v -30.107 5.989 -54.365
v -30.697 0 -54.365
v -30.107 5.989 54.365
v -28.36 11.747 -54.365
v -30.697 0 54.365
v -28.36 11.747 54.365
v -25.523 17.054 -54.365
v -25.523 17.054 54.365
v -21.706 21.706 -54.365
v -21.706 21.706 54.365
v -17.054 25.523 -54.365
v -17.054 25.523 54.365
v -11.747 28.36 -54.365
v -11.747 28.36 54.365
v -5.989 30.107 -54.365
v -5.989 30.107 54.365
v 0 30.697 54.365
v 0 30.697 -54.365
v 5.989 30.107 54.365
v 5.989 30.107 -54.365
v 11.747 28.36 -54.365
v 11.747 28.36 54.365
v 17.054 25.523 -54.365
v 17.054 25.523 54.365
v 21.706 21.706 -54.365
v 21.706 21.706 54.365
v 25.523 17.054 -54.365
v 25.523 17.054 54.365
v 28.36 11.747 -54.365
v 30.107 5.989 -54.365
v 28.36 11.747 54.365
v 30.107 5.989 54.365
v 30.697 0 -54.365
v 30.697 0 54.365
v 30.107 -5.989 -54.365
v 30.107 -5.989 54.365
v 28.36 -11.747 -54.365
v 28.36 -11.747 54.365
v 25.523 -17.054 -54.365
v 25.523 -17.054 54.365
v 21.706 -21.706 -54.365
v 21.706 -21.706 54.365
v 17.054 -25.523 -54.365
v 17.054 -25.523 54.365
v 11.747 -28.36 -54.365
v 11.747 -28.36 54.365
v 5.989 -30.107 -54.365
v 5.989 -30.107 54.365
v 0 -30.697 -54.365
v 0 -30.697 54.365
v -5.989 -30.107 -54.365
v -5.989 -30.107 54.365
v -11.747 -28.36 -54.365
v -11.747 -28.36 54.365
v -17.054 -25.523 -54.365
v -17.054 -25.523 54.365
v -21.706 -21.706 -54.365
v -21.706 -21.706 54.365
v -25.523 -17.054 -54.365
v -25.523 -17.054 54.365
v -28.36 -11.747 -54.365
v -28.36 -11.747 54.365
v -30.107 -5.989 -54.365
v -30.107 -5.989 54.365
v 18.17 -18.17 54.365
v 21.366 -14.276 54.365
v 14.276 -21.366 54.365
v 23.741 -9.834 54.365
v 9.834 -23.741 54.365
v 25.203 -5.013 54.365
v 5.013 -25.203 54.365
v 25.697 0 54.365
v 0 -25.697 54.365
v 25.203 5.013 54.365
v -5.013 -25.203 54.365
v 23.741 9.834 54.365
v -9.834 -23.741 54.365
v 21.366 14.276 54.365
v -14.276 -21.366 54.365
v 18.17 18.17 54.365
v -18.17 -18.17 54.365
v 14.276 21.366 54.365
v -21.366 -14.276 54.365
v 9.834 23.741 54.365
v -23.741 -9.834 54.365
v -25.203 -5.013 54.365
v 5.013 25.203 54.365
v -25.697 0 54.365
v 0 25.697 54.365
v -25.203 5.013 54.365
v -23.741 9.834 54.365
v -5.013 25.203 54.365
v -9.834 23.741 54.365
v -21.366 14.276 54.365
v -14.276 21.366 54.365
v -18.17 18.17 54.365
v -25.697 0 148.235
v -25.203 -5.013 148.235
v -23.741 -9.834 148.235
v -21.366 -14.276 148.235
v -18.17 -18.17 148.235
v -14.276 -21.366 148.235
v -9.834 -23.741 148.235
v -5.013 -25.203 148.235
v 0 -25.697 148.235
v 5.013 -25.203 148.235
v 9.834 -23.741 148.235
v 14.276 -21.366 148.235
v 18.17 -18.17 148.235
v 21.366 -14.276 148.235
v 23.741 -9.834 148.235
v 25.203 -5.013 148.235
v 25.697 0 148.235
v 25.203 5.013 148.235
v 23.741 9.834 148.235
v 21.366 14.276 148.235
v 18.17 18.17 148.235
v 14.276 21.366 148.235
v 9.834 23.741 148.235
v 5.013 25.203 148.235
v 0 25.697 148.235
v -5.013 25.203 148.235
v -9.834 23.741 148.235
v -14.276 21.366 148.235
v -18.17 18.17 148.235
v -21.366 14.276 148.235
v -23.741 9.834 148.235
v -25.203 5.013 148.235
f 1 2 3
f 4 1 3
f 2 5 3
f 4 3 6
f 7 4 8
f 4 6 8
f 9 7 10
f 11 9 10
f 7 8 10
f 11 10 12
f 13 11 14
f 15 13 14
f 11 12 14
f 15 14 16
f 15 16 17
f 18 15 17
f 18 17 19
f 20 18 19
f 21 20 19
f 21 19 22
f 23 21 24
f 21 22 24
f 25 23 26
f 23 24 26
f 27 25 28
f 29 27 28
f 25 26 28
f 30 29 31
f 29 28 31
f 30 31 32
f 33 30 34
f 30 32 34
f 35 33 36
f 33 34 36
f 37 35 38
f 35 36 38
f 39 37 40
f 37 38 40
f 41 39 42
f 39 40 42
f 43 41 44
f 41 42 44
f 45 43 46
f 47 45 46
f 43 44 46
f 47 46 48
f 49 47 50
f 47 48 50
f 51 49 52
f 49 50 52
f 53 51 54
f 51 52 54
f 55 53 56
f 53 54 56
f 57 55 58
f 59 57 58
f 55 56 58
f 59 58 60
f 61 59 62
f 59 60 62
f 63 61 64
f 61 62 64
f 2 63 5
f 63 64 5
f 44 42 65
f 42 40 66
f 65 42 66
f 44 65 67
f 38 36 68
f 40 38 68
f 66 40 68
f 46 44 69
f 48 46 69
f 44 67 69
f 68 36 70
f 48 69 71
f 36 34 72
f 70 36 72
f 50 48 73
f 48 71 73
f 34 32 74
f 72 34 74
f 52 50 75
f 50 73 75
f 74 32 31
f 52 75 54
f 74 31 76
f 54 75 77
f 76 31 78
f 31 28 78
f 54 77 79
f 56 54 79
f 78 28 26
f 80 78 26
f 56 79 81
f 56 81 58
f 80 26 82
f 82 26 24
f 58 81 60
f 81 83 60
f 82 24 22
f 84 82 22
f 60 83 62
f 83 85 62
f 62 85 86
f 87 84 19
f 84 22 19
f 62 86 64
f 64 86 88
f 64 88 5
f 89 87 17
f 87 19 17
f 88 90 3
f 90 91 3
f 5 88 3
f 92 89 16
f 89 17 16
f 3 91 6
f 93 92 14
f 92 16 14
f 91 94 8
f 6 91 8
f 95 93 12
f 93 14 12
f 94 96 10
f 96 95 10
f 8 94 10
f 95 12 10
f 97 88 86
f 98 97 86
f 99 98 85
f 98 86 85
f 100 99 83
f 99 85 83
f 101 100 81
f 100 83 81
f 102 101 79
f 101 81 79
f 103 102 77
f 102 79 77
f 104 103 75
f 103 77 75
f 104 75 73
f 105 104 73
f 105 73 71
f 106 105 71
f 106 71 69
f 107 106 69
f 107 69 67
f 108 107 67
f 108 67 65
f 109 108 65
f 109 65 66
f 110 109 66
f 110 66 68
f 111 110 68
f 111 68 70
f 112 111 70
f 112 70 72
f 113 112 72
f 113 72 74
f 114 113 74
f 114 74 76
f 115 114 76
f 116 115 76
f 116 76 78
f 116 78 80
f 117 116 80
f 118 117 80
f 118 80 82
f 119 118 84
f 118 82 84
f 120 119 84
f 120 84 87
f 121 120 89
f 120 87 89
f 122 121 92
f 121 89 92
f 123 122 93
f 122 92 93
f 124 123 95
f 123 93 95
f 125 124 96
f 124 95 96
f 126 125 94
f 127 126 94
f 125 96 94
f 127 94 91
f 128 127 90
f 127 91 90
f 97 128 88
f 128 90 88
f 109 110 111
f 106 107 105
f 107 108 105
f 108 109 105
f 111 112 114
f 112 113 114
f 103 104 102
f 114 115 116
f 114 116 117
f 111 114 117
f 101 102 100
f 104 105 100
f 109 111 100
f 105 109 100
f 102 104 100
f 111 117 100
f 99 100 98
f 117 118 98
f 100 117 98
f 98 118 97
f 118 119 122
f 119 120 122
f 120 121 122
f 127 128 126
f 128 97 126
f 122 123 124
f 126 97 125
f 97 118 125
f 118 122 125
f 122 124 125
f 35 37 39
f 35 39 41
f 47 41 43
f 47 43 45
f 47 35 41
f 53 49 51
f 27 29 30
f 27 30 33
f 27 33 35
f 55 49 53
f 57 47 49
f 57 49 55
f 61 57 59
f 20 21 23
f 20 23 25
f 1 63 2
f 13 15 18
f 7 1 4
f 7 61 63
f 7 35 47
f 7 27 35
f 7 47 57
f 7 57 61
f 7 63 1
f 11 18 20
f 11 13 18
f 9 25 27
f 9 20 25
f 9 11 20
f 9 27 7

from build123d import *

# Parameters (mm, degrees)
F0_W     = 30.6967236102
F0_H     = 108.7295114994
F2_T     = -5
F3_DEPTH = 25
F4_DEPTH = 172.6


with BuildPart() as f1:
    # F0 (on Front) → F1 (revolve)
    with BuildSketch(Plane.XZ):
        with Locations((-15.3483618051, 0)):
            Rectangle(F0_W, F0_H)
    revolve(axis=Axis((0, 0, -2.295082435), (0, 0, -1)))

    # F2
    f2_openings = [f1.faces().sort_by_distance(p)[0] for p in [
        (0, 0, 54.364756),
    ]]
    offset(amount=F2_T, openings=f2_openings)

    # F3 (add): a face of the model
    f3_faces = [f1.faces().sort_by_distance(p)[0] for p in [
        (0, 0, -49.3647557497),
    ]]
    extrude(f3_faces, amount=F3_DEPTH)

    # F4 (add): a face of the model
    f4_faces = [f1.faces().sort_by_distance(p)[0] for p in [
        (0, 0, -24.3647557497),
    ]]
    extrude(f4_faces, amount=F4_DEPTH)


solid = f1.part
